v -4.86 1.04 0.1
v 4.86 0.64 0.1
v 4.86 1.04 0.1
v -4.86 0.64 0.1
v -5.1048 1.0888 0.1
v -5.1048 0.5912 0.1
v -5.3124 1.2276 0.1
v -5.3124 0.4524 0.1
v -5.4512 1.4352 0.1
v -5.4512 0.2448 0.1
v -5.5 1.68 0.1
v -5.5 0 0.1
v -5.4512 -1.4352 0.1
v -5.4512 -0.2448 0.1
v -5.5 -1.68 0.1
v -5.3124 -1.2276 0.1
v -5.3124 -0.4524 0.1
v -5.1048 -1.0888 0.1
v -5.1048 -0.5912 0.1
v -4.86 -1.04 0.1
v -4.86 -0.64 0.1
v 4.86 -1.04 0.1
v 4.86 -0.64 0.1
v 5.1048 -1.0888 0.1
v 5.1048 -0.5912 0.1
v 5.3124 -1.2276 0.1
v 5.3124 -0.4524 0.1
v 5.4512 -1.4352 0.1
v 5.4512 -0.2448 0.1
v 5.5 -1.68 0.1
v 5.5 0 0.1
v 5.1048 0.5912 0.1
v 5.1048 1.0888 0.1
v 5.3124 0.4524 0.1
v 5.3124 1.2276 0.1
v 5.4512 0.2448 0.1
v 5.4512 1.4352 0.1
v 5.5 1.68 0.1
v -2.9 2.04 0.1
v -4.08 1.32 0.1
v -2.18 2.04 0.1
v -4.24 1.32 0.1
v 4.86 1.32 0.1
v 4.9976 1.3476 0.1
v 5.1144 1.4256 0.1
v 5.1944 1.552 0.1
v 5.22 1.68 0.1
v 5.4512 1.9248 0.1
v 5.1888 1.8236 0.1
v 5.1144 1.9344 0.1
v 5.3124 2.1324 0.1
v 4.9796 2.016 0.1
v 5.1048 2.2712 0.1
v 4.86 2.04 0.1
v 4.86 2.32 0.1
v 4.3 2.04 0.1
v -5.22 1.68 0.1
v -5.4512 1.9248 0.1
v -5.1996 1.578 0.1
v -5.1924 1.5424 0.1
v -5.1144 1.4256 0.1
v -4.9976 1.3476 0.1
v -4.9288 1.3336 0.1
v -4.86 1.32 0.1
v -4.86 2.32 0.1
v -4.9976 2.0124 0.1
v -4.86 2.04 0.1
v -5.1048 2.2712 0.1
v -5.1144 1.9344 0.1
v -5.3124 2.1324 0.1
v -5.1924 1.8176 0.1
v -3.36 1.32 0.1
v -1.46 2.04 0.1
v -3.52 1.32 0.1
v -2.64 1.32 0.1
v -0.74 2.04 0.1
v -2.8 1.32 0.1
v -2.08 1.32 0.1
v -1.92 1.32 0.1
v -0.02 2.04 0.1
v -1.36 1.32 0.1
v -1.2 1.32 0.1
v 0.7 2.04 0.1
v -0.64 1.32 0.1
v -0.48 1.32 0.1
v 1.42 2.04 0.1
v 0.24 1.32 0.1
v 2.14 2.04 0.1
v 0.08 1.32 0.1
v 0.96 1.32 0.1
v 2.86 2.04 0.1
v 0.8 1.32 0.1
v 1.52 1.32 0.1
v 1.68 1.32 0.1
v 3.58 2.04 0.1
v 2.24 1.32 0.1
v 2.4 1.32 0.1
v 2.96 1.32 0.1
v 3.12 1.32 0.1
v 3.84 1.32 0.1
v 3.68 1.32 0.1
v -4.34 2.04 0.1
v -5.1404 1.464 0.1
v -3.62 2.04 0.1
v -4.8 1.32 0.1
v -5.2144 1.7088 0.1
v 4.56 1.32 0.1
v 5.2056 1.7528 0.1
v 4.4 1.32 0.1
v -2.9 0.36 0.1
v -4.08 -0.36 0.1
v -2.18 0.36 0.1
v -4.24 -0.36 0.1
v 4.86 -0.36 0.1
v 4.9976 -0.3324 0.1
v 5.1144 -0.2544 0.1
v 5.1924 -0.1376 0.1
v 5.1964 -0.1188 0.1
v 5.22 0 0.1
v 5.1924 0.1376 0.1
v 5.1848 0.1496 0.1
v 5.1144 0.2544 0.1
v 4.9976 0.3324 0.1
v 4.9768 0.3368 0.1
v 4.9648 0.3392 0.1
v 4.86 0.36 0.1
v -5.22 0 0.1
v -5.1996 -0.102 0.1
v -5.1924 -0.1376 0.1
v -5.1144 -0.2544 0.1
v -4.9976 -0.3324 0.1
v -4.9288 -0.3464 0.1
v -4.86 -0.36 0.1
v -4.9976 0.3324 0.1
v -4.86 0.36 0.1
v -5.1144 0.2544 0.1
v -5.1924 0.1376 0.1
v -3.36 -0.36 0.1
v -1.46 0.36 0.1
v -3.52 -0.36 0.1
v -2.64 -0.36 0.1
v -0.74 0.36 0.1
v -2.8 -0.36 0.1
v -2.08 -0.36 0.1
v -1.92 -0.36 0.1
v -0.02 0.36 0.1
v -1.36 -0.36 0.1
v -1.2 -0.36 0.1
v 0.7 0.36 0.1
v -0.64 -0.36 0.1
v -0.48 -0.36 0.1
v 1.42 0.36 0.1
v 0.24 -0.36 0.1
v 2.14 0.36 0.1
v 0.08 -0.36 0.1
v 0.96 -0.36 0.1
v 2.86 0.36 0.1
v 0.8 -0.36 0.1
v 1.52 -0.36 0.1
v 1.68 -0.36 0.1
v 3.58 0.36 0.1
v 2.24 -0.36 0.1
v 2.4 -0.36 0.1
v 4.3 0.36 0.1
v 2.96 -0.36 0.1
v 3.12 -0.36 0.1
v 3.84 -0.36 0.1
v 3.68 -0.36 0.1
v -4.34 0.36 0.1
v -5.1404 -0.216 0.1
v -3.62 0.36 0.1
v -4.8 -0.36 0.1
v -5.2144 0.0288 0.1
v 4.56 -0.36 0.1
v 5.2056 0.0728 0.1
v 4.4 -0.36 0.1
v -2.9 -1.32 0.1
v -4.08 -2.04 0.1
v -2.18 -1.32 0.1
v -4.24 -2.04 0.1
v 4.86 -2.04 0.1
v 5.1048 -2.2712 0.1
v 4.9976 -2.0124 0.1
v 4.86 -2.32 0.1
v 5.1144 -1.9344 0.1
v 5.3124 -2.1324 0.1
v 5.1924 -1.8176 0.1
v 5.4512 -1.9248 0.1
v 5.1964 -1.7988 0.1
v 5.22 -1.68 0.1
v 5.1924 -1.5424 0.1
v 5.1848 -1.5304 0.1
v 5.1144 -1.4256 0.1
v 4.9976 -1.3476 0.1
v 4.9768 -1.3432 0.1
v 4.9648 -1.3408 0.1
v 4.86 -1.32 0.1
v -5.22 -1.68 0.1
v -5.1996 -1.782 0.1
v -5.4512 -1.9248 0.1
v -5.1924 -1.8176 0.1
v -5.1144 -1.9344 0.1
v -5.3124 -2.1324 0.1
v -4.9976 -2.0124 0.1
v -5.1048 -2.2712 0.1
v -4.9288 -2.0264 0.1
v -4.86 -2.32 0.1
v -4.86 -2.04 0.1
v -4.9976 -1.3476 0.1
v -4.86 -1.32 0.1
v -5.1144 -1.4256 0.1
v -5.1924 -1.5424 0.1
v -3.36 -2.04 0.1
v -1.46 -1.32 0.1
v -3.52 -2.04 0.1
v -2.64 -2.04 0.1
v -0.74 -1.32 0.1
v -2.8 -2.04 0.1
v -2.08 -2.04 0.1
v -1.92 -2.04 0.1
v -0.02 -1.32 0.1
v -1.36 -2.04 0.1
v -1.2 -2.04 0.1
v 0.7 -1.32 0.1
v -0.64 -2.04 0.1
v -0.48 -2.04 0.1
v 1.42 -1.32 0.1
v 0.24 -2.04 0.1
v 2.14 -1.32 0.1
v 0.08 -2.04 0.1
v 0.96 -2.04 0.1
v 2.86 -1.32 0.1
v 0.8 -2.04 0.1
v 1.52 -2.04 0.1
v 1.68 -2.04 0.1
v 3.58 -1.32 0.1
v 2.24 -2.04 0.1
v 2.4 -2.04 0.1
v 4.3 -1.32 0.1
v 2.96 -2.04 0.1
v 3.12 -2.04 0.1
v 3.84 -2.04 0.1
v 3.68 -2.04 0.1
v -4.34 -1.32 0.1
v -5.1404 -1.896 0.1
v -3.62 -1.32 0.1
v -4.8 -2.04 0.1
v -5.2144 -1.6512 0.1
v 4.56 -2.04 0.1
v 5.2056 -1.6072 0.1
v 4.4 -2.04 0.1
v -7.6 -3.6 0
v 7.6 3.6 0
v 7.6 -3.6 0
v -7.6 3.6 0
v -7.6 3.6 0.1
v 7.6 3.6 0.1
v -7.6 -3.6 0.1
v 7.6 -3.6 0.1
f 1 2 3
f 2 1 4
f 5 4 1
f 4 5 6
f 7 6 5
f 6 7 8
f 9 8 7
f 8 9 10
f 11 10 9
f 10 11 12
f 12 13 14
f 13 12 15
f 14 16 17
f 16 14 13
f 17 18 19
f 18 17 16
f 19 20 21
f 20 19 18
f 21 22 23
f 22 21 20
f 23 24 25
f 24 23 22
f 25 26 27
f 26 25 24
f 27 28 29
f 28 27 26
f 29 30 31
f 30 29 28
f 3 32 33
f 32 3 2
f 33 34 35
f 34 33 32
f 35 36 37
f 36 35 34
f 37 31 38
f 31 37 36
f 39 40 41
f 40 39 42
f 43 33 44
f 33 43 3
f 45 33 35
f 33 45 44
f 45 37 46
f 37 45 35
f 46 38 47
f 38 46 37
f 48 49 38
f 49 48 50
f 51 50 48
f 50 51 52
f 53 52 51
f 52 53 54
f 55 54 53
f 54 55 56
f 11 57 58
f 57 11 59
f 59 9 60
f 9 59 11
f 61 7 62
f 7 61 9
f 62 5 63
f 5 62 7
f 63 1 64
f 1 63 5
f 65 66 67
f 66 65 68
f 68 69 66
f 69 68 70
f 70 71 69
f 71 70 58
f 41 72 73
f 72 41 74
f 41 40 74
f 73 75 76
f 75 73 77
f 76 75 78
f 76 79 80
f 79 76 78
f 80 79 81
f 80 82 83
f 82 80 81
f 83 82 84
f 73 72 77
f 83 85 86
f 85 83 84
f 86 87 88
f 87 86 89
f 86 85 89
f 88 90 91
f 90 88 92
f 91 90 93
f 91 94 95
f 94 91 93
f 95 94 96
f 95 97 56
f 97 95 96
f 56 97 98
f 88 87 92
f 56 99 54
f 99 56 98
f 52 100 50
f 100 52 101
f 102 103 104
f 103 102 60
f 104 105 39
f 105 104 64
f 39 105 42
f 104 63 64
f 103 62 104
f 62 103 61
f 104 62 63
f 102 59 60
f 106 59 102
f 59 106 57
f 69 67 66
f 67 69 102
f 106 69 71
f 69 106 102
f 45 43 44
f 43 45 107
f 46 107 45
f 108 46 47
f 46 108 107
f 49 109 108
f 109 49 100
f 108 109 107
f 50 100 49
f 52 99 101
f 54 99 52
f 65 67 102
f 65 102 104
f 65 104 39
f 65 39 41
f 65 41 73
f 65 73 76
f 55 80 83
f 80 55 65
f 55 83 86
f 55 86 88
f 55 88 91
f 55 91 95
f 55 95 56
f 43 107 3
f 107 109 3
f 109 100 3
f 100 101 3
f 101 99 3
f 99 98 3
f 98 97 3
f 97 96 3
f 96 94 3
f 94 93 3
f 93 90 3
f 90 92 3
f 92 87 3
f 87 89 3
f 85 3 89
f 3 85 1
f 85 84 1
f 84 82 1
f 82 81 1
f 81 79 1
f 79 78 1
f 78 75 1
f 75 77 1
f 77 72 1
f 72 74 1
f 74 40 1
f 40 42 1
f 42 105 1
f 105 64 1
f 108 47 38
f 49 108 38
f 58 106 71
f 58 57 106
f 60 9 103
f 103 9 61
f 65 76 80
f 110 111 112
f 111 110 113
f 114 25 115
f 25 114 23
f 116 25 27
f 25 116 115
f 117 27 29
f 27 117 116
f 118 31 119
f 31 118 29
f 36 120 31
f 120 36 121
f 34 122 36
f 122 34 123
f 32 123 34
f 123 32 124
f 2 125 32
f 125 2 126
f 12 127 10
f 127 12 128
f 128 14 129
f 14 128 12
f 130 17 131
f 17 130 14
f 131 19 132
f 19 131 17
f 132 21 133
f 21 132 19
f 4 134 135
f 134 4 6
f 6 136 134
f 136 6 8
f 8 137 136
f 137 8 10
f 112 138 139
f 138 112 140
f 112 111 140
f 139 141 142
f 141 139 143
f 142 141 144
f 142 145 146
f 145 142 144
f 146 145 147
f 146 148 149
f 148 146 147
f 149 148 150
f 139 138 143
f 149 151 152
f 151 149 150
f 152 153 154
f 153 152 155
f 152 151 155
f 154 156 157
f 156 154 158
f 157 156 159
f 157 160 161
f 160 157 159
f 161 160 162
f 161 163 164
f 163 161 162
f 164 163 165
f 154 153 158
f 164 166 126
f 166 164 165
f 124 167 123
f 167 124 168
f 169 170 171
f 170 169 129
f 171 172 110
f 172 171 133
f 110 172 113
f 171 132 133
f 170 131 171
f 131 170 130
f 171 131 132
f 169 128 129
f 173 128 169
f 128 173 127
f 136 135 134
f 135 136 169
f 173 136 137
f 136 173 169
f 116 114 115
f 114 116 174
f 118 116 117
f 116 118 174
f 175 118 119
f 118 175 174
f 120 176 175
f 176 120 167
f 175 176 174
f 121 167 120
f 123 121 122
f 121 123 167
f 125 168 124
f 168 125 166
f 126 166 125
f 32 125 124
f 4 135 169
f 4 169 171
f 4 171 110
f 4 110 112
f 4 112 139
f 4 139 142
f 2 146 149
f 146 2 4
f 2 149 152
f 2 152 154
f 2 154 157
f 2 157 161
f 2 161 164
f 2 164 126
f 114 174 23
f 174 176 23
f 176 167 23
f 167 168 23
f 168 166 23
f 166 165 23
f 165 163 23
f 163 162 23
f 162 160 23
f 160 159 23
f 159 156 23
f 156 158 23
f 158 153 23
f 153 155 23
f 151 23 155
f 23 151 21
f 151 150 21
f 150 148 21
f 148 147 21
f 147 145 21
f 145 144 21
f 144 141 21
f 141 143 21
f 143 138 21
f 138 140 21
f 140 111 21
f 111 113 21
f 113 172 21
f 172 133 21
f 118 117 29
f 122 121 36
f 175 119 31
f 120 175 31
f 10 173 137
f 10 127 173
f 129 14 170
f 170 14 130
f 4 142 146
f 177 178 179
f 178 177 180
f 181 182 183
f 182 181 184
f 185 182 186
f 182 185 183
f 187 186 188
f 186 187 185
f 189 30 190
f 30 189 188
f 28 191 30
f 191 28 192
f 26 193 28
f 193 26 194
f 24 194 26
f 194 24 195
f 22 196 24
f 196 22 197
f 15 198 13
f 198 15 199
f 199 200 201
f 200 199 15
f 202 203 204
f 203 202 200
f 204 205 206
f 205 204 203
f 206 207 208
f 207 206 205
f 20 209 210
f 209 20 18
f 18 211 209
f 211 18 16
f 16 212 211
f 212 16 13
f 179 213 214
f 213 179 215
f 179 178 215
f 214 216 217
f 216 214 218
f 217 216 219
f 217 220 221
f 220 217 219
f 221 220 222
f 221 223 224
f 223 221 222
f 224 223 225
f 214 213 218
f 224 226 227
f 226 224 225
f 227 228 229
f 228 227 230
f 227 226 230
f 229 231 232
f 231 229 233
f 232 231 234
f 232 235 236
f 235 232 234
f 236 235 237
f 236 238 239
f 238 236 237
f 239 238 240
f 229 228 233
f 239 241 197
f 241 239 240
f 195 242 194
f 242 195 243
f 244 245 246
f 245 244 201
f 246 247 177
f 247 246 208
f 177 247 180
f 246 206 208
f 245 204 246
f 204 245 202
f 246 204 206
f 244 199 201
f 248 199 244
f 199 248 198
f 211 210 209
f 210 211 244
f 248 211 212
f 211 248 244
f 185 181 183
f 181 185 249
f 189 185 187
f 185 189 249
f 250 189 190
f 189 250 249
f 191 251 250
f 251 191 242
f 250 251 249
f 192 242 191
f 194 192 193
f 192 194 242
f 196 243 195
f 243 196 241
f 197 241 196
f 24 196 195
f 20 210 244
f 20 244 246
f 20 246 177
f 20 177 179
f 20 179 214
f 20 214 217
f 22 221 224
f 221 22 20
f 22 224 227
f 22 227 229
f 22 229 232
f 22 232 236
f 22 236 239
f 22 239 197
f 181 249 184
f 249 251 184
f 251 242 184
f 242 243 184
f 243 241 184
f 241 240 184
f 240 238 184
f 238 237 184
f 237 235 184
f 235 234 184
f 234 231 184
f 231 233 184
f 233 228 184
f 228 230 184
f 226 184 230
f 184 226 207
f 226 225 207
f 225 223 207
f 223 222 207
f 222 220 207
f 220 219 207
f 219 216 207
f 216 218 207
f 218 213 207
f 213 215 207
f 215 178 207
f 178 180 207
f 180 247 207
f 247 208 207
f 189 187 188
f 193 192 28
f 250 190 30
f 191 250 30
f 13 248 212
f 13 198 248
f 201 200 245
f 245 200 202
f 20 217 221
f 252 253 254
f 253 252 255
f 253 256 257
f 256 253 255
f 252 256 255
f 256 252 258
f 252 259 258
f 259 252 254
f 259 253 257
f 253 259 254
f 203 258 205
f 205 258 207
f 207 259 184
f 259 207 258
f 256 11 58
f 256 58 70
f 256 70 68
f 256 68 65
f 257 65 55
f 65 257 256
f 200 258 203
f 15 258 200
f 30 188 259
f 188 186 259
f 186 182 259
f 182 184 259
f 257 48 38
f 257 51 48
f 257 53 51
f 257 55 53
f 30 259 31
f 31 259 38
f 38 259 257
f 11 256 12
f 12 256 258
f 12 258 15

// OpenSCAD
// file: ../p/box5-12.scad
use <../lib.scad>
function ldraw_lib__box5_12() = [
// 0 Box with 5 Faces without Any Edges
// 0 Name: box5-12.dat
// 0 Author: Chris Dee [cwdee]
// 0 !LDRAW_ORG Primitive UPDATE 2009-02
// 0 !LICENSE Licensed under CC BY 4.0 : see CAreadme.txt
// 
// 0 BFC CERTIFY CCW
  [0,"BFC","CERTIFY"],
  [0,"BFC","CCW"],
// 
// 0 !HISTORY 2009-09-03 [PTadmin] Official Update 2009-02
// 
// 
// 4 16 1 1 1 1 1 -1 -1 1 -1 -1 1 1
  [4,16,1,1,1,1,1,-1,-1,1,-1,-1,1,1],
// 4 16 -1 0 1 1 0 1 1 1 1 -1 1 1
  [4,16,-1,0,1,1,0,1,1,1,1,-1,1,1],
// 4 16 -1 0 -1 -1 0 1 -1 1 1 -1 1 -1
  [4,16,-1,0,-1,-1,0,1,-1,1,1,-1,1,-1],
// 4 16 1 0 -1 -1 0 -1 -1 1 -1 1 1 -1
  [4,16,1,0,-1,-1,0,-1,-1,1,-1,1,1,-1],
// 4 16 1 0 1 1 0 -1 1 1 -1 1 1 1
  [4,16,1,0,1,1,0,-1,1,1,-1,1,1,1],
// 0
];
module ldraw_lib__box5_12(step=0, col=false, unit=2/5, alt=false, line=0.2, solid=!$preview)
    makepoly(ldraw_lib__box5_12(), step=step, col=col, unit=unit, alt=alt, line=line, solid=solid);
ldraw_lib__box5_12(line=0.2);
// main file
use <../lib.scad>
use <../p/box5-12.scad>
use <s/4188571cs01.scad>
function ldraw_lib__4263304f() = [
// 0 Sticker  0.9 x  1.9 with Horizontal Grille
// 0 Name: 4263304f.dat
// 0 Author: Gerald Lasser [GeraldLasser]
// 0 !LDRAW_ORG Part UPDATE 2023-04
// 0 !LICENSE Licensed under CC BY 4.0 : see CAreadme.txt
// 
// 0 BFC CERTIFY CCW
  [0,"BFC","CERTIFY"],
  [0,"BFC","CCW"],
// 
// 0 !KEYWORDS BNSF, Bricklink 10133stk01, Brickowl 912944, Rebrickable 53049
// 0 !KEYWORDS Sante Fe, Set 10133
// 
// 0 !HISTORY 2023-08-25 [OrionP] Official Update 2023-04
// 
// 
// 1 16 0 -.25 0 1 0 0 0 1 0 0 0 1 s\4188571cs01.dat
  [1,16,0,-.25,0,1,0,0,0,1,0,0,0,1, ldraw_lib__s__4188571cs01()],
// 
// 1 16 0 -0.25 0 19 0 0 0 0.25 0 0 0 9 box5-12.dat
  [1,16,0,-0.25,0,19,0,0,0,0.25,0,0,0,9, ldraw_lib__box5_12()],
// 
// 3 16 -13.281 -.25 -5.331 -19 -.25 -9 -12.762 -.25 -5.678
  [3,16,-13.281,-.25,-5.331,-19,-.25,-9,-12.762,-.25,-5.678],
// 3 16 -12.762 -.25 -5.678 -19 -.25 -9 -12.15 -.25 -5.8
  [3,16,-12.762,-.25,-5.678,-19,-.25,-9,-12.15,-.25,-5.8],
// 4 16 12.15 -.25 -5.8 -12.15 -.25 -5.8 -19 -.25 -9 19 -.25 -9
  [4,16,12.15,-.25,-5.8,-12.15,-.25,-5.8,-19,-.25,-9,19,-.25,-9],
// 3 16 -19 -.25 9 -13.75 -.25 4.2 -13.628 -.25 4.812
  [3,16,-19,-.25,9,-13.75,-.25,4.2,-13.628,-.25,4.812],
// 3 16 -19 -.25 9 -13.628 -.25 4.812 -13.281 -.25 5.331
  [3,16,-19,-.25,9,-13.628,-.25,4.812,-13.281,-.25,5.331],
// 3 16 -19 -.25 9 -13.281 -.25 5.331 -12.762 -.25 5.678
  [3,16,-19,-.25,9,-13.281,-.25,5.331,-12.762,-.25,5.678],
// 3 16 -19 -.25 9 -12.762 -.25 5.678 -12.15 -.25 5.8
  [3,16,-19,-.25,9,-12.762,-.25,5.678,-12.15,-.25,5.8],
// 4 16 -19 -.25 9 -12.15 -.25 5.8 12.15 -.25 5.8 19 -.25 9
  [4,16,-19,-.25,9,-12.15,-.25,5.8,12.15,-.25,5.8,19,-.25,9],
// 3 16 -13.628 -.25 -4.812 -19 -.25 -9 -13.281 -.25 -5.331
  [3,16,-13.628,-.25,-4.812,-19,-.25,-9,-13.281,-.25,-5.331],
// 3 16 -13.75 -.25 -4.2 -19 -.25 -9 -13.628 -.25 -4.812
  [3,16,-13.75,-.25,-4.2,-19,-.25,-9,-13.628,-.25,-4.812],
// 3 16 13.75 -.25 -4.2 13.628 -.25 -4.812 19 -.25 -9
  [3,16,13.75,-.25,-4.2,13.628,-.25,-4.812,19,-.25,-9],
// 3 16 13.628 -.25 -4.812 13.281 -.25 -5.331 19 -.25 -9
  [3,16,13.628,-.25,-4.812,13.281,-.25,-5.331,19,-.25,-9],
// 3 16 13.281 -.25 -5.331 12.762 -.25 -5.678 19 -.25 -9
  [3,16,13.281,-.25,-5.331,12.762,-.25,-5.678,19,-.25,-9],
// 3 16 12.762 -.25 -5.678 12.15 -.25 -5.8 19 -.25 -9
  [3,16,12.762,-.25,-5.678,12.15,-.25,-5.8,19,-.25,-9],
// 3 16 19 -.25 9 13.628 -.25 4.812 13.75 -.25 4.2
  [3,16,19,-.25,9,13.628,-.25,4.812,13.75,-.25,4.2],
// 3 16 19 -.25 9 13.281 -.25 5.331 13.628 -.25 4.812
  [3,16,19,-.25,9,13.281,-.25,5.331,13.628,-.25,4.812],
// 3 16 19 -.25 9 12.762 -.25 5.678 13.281 -.25 5.331
  [3,16,19,-.25,9,12.762,-.25,5.678,13.281,-.25,5.331],
// 3 16 19 -.25 9 12.15 -.25 5.8 12.762 -.25 5.678
  [3,16,19,-.25,9,12.15,-.25,5.8,12.762,-.25,5.678],
// 3 16 13.75 -.25 -4.2 19 -.25 -9 13.75 -.25 0
  [3,16,13.75,-.25,-4.2,19,-.25,-9,13.75,-.25,0],
// 3 16 13.75 -.25 0 19 -.25 -9 13.75 -.25 4.2
  [3,16,13.75,-.25,0,19,-.25,-9,13.75,-.25,4.2],
// 3 16 13.75 -.25 4.2 19 -.25 -9 19 -.25 9
  [3,16,13.75,-.25,4.2,19,-.25,-9,19,-.25,9],
// 3 16 -13.75 -.25 4.2 -19 -.25 9 -13.75 -.25 0
  [3,16,-13.75,-.25,4.2,-19,-.25,9,-13.75,-.25,0],
// 3 16 -13.75 -.25 0 -19 -.25 9 -19 -.25 -9
  [3,16,-13.75,-.25,0,-19,-.25,9,-19,-.25,-9],
// 3 16 -13.75 -.25 0 -19 -.25 -9 -13.75 -.25 -4.2
  [3,16,-13.75,-.25,0,-19,-.25,-9,-13.75,-.25,-4.2],
];
module ldraw_lib__4263304f(step=0, col=false, unit=2/5, alt=false, line=0.2, solid=!$preview)
    makepoly(ldraw_lib__4263304f(), step=step, col=col, unit=unit, alt=alt, line=line, solid=solid);
ldraw_lib__4263304f(line=0.2);
